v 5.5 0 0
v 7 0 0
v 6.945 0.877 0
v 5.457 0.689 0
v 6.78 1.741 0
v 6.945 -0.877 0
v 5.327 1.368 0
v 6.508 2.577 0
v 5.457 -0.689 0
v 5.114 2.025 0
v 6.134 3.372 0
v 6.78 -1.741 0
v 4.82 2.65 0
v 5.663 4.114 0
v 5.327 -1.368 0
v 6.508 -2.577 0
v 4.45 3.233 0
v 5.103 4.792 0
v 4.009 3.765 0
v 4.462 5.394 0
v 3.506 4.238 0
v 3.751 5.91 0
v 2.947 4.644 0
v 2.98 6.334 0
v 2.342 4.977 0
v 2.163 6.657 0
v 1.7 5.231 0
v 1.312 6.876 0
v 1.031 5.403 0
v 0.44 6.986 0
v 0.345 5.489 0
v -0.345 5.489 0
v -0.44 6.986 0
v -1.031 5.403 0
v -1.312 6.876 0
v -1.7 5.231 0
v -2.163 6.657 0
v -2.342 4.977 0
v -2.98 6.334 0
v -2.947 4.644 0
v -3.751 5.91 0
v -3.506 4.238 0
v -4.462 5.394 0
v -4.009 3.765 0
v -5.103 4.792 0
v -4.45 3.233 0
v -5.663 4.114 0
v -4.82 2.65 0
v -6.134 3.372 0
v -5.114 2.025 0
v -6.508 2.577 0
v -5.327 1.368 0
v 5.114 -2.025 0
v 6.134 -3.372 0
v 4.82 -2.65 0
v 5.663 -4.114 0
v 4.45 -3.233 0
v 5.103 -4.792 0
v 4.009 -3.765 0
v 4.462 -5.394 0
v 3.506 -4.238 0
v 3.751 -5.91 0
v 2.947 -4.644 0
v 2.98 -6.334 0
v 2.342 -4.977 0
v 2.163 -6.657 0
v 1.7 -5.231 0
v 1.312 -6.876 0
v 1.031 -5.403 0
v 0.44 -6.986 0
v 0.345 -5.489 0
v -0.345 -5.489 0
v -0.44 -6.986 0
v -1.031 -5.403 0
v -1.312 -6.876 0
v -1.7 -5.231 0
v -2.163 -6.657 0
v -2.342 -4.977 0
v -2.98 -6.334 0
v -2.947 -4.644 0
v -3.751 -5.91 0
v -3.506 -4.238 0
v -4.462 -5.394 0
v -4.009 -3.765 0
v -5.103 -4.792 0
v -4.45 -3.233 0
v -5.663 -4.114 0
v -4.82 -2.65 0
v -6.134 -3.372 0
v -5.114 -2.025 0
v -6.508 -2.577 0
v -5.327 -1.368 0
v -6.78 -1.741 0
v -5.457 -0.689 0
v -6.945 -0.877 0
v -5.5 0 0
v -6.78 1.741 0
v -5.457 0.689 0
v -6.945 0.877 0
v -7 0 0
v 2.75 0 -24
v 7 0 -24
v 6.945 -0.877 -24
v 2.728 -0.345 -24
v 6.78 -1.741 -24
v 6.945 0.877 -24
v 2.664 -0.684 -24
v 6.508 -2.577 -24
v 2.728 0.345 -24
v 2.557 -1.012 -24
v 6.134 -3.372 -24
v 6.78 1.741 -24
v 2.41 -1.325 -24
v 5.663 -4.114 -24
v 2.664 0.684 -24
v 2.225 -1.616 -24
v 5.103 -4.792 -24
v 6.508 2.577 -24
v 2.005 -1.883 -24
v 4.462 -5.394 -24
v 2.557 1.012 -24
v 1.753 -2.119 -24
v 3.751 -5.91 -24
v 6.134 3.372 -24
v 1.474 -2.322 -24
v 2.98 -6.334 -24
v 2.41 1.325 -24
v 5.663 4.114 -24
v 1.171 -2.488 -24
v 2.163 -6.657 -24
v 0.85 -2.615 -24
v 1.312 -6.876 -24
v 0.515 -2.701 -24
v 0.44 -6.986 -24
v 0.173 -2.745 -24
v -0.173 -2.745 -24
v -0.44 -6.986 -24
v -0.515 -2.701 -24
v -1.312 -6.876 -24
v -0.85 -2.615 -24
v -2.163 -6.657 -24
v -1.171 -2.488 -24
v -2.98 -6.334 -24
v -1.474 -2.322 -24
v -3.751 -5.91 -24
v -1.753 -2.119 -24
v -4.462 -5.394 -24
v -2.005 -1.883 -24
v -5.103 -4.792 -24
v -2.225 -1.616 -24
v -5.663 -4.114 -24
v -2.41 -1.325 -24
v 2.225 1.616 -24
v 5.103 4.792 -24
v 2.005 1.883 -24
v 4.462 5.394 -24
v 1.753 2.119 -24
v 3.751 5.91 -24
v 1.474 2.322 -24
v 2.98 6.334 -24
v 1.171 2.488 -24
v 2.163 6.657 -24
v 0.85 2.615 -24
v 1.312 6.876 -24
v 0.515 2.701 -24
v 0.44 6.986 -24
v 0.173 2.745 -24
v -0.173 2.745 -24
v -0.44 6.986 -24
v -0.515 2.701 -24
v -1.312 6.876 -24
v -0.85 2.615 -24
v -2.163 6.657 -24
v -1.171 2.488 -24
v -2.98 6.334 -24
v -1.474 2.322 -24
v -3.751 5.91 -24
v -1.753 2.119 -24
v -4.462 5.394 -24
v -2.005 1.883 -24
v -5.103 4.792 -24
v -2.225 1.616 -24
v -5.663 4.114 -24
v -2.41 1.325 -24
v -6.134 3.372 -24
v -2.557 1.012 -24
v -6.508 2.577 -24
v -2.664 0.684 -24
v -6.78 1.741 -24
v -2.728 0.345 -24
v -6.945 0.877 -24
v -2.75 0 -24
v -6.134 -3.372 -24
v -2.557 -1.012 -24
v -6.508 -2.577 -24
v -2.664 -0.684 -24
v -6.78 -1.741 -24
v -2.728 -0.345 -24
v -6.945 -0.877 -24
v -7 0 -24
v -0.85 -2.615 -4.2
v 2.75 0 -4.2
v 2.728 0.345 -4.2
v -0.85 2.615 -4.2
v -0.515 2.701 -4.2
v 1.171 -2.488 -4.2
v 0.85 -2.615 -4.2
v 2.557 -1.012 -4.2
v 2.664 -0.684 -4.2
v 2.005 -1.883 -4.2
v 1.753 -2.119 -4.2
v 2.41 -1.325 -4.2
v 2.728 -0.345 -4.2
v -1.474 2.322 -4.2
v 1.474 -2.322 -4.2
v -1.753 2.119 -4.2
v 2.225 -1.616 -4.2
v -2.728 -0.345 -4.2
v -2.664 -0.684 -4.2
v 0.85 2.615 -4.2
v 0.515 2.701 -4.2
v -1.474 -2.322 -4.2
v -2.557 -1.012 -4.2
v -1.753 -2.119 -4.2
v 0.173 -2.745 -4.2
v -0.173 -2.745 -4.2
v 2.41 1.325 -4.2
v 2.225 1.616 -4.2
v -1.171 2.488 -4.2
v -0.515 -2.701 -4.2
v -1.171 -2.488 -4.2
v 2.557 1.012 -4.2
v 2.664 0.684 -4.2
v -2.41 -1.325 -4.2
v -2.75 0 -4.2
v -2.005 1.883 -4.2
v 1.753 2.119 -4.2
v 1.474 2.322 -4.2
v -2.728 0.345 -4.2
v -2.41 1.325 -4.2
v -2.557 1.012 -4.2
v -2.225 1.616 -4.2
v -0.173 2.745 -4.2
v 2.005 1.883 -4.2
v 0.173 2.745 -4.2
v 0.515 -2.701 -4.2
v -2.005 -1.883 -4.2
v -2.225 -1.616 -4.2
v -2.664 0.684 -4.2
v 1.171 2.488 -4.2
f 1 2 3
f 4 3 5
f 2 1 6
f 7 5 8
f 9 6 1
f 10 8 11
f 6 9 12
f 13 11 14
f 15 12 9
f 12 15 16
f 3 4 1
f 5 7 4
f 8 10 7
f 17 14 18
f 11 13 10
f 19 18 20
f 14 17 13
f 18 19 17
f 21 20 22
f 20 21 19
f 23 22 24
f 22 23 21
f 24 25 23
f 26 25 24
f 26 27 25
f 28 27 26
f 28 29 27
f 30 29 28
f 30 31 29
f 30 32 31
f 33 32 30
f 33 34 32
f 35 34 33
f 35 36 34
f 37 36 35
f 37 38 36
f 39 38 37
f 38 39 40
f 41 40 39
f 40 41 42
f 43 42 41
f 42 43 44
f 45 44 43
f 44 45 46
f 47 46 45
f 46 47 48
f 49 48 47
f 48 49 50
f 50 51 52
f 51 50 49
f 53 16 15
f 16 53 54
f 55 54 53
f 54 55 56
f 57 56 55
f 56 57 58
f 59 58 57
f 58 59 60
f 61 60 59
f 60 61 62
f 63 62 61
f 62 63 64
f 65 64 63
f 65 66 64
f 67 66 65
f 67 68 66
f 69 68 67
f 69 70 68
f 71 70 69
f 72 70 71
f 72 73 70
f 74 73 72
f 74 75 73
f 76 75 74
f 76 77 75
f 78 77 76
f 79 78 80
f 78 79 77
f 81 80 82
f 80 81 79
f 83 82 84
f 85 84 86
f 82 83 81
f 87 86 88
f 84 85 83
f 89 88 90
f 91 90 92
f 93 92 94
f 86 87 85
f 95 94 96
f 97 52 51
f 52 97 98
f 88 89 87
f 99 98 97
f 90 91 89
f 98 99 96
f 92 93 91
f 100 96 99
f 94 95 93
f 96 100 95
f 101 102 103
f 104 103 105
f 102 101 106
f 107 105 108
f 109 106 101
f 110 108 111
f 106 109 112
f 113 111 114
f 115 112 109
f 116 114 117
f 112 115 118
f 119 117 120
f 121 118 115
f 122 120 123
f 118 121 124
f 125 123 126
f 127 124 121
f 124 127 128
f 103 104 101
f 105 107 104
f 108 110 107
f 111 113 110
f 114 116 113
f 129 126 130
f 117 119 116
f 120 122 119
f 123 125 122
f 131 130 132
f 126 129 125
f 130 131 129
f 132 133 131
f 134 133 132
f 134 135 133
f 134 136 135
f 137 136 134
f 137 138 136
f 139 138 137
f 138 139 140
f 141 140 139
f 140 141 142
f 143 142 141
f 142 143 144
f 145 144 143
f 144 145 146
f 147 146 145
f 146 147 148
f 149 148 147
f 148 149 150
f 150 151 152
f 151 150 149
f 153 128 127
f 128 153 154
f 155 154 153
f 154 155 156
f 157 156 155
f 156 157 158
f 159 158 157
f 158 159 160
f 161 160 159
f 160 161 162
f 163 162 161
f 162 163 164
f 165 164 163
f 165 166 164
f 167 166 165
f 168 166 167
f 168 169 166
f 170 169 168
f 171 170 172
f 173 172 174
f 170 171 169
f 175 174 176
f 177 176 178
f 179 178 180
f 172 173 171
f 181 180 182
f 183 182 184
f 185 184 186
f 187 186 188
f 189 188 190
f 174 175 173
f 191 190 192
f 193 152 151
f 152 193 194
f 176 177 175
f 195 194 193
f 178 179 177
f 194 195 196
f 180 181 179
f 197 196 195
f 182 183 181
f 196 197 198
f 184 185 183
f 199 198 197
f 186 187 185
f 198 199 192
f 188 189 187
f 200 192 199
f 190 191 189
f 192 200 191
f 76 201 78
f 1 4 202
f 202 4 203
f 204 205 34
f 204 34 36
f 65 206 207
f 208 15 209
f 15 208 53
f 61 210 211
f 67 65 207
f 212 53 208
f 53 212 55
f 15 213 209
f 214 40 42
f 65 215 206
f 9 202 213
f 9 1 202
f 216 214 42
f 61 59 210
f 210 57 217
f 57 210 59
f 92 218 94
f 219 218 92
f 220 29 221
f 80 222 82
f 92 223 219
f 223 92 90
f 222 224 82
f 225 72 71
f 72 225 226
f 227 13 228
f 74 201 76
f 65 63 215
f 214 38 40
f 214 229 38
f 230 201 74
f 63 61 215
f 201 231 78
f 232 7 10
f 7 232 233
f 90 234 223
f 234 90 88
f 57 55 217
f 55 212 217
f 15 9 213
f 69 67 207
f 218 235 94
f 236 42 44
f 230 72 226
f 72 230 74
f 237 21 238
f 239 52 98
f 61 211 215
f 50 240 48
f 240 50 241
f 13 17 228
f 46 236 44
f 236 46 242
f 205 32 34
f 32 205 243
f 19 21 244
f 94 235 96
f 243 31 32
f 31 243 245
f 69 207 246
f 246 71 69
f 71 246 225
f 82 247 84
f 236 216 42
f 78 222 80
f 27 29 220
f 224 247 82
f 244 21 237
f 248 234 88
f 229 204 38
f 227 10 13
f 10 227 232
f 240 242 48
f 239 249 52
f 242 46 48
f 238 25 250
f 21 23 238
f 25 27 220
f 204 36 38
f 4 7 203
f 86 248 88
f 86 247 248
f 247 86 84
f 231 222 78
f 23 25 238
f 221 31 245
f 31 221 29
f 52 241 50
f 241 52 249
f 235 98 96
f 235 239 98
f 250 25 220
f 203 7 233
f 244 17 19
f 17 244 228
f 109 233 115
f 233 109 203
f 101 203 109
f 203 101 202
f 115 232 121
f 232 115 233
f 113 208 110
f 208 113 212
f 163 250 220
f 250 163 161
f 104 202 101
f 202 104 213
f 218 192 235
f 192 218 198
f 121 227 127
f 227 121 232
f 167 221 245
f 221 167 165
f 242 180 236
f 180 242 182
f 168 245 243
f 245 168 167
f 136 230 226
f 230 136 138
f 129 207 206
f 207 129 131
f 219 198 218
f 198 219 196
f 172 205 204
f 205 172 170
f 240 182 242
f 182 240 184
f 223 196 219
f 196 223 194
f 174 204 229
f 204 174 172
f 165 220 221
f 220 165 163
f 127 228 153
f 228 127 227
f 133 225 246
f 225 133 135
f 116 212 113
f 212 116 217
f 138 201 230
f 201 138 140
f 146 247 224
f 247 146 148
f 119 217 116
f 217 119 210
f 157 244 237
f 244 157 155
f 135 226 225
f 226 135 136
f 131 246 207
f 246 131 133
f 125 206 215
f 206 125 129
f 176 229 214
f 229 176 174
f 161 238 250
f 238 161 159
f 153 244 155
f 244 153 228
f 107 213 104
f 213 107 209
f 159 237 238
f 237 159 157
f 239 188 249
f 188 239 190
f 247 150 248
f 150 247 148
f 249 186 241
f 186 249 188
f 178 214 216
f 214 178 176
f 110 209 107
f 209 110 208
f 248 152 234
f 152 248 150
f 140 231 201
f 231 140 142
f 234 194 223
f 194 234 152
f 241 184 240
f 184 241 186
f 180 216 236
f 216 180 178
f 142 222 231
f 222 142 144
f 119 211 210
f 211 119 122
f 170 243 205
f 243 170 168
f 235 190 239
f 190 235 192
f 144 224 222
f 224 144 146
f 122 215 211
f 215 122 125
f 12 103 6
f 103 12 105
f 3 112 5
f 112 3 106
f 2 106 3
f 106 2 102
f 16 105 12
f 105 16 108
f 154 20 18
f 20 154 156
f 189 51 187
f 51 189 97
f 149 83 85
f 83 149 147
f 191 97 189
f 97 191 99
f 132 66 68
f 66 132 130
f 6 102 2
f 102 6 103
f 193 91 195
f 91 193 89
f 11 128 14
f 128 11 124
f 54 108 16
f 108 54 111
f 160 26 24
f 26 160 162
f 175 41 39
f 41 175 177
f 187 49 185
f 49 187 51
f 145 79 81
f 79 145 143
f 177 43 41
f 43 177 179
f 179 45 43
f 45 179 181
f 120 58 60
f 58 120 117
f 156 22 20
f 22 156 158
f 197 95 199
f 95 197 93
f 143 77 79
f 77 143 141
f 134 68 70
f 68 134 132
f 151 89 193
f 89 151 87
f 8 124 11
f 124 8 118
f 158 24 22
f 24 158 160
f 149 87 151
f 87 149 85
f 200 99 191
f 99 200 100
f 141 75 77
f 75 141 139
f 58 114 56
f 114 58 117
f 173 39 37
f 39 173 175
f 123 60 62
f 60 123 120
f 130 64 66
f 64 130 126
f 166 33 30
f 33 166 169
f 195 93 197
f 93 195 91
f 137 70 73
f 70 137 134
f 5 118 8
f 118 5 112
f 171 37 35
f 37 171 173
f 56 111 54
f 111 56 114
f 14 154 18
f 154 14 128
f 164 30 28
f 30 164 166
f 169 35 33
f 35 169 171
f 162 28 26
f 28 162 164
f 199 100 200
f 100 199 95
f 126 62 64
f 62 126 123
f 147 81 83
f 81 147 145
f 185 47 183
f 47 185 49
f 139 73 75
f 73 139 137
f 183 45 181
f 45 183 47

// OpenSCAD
$fn = 50;


difference() {
	union() {
		translate(v = [0, 0, -24.0000000000]) {
			cylinder(h = 24, r = 7.0000000000);
		}
		cylinder(h = 0, r = 16.0000000000);
	}
	union() {
		translate(v = [0, 0, 0]) {
			rotate(a = [0, 0, 0]) {
				difference() {
					union() {
						#translate(v = [0, 0, -24.0000000000]) {
							cylinder(h = 24, r = 2.2500000000);
						}
						#translate(v = [0, 0, -4.2000000000]) {
							cylinder(h = 4.2000000000, r = 7.0000000000, r1 = 2.7500000000, r2 = 5.5000000000);
						}
						#translate(v = [0, 0, -24.0000000000]) {
							cylinder(h = 24, r = 2.7500000000);
						}
						#translate(v = [0, 0, -24.0000000000]) {
							cylinder(h = 24, r = 2.2500000000);
						}
					}
					union();
				}
			}
		}
	}
}
